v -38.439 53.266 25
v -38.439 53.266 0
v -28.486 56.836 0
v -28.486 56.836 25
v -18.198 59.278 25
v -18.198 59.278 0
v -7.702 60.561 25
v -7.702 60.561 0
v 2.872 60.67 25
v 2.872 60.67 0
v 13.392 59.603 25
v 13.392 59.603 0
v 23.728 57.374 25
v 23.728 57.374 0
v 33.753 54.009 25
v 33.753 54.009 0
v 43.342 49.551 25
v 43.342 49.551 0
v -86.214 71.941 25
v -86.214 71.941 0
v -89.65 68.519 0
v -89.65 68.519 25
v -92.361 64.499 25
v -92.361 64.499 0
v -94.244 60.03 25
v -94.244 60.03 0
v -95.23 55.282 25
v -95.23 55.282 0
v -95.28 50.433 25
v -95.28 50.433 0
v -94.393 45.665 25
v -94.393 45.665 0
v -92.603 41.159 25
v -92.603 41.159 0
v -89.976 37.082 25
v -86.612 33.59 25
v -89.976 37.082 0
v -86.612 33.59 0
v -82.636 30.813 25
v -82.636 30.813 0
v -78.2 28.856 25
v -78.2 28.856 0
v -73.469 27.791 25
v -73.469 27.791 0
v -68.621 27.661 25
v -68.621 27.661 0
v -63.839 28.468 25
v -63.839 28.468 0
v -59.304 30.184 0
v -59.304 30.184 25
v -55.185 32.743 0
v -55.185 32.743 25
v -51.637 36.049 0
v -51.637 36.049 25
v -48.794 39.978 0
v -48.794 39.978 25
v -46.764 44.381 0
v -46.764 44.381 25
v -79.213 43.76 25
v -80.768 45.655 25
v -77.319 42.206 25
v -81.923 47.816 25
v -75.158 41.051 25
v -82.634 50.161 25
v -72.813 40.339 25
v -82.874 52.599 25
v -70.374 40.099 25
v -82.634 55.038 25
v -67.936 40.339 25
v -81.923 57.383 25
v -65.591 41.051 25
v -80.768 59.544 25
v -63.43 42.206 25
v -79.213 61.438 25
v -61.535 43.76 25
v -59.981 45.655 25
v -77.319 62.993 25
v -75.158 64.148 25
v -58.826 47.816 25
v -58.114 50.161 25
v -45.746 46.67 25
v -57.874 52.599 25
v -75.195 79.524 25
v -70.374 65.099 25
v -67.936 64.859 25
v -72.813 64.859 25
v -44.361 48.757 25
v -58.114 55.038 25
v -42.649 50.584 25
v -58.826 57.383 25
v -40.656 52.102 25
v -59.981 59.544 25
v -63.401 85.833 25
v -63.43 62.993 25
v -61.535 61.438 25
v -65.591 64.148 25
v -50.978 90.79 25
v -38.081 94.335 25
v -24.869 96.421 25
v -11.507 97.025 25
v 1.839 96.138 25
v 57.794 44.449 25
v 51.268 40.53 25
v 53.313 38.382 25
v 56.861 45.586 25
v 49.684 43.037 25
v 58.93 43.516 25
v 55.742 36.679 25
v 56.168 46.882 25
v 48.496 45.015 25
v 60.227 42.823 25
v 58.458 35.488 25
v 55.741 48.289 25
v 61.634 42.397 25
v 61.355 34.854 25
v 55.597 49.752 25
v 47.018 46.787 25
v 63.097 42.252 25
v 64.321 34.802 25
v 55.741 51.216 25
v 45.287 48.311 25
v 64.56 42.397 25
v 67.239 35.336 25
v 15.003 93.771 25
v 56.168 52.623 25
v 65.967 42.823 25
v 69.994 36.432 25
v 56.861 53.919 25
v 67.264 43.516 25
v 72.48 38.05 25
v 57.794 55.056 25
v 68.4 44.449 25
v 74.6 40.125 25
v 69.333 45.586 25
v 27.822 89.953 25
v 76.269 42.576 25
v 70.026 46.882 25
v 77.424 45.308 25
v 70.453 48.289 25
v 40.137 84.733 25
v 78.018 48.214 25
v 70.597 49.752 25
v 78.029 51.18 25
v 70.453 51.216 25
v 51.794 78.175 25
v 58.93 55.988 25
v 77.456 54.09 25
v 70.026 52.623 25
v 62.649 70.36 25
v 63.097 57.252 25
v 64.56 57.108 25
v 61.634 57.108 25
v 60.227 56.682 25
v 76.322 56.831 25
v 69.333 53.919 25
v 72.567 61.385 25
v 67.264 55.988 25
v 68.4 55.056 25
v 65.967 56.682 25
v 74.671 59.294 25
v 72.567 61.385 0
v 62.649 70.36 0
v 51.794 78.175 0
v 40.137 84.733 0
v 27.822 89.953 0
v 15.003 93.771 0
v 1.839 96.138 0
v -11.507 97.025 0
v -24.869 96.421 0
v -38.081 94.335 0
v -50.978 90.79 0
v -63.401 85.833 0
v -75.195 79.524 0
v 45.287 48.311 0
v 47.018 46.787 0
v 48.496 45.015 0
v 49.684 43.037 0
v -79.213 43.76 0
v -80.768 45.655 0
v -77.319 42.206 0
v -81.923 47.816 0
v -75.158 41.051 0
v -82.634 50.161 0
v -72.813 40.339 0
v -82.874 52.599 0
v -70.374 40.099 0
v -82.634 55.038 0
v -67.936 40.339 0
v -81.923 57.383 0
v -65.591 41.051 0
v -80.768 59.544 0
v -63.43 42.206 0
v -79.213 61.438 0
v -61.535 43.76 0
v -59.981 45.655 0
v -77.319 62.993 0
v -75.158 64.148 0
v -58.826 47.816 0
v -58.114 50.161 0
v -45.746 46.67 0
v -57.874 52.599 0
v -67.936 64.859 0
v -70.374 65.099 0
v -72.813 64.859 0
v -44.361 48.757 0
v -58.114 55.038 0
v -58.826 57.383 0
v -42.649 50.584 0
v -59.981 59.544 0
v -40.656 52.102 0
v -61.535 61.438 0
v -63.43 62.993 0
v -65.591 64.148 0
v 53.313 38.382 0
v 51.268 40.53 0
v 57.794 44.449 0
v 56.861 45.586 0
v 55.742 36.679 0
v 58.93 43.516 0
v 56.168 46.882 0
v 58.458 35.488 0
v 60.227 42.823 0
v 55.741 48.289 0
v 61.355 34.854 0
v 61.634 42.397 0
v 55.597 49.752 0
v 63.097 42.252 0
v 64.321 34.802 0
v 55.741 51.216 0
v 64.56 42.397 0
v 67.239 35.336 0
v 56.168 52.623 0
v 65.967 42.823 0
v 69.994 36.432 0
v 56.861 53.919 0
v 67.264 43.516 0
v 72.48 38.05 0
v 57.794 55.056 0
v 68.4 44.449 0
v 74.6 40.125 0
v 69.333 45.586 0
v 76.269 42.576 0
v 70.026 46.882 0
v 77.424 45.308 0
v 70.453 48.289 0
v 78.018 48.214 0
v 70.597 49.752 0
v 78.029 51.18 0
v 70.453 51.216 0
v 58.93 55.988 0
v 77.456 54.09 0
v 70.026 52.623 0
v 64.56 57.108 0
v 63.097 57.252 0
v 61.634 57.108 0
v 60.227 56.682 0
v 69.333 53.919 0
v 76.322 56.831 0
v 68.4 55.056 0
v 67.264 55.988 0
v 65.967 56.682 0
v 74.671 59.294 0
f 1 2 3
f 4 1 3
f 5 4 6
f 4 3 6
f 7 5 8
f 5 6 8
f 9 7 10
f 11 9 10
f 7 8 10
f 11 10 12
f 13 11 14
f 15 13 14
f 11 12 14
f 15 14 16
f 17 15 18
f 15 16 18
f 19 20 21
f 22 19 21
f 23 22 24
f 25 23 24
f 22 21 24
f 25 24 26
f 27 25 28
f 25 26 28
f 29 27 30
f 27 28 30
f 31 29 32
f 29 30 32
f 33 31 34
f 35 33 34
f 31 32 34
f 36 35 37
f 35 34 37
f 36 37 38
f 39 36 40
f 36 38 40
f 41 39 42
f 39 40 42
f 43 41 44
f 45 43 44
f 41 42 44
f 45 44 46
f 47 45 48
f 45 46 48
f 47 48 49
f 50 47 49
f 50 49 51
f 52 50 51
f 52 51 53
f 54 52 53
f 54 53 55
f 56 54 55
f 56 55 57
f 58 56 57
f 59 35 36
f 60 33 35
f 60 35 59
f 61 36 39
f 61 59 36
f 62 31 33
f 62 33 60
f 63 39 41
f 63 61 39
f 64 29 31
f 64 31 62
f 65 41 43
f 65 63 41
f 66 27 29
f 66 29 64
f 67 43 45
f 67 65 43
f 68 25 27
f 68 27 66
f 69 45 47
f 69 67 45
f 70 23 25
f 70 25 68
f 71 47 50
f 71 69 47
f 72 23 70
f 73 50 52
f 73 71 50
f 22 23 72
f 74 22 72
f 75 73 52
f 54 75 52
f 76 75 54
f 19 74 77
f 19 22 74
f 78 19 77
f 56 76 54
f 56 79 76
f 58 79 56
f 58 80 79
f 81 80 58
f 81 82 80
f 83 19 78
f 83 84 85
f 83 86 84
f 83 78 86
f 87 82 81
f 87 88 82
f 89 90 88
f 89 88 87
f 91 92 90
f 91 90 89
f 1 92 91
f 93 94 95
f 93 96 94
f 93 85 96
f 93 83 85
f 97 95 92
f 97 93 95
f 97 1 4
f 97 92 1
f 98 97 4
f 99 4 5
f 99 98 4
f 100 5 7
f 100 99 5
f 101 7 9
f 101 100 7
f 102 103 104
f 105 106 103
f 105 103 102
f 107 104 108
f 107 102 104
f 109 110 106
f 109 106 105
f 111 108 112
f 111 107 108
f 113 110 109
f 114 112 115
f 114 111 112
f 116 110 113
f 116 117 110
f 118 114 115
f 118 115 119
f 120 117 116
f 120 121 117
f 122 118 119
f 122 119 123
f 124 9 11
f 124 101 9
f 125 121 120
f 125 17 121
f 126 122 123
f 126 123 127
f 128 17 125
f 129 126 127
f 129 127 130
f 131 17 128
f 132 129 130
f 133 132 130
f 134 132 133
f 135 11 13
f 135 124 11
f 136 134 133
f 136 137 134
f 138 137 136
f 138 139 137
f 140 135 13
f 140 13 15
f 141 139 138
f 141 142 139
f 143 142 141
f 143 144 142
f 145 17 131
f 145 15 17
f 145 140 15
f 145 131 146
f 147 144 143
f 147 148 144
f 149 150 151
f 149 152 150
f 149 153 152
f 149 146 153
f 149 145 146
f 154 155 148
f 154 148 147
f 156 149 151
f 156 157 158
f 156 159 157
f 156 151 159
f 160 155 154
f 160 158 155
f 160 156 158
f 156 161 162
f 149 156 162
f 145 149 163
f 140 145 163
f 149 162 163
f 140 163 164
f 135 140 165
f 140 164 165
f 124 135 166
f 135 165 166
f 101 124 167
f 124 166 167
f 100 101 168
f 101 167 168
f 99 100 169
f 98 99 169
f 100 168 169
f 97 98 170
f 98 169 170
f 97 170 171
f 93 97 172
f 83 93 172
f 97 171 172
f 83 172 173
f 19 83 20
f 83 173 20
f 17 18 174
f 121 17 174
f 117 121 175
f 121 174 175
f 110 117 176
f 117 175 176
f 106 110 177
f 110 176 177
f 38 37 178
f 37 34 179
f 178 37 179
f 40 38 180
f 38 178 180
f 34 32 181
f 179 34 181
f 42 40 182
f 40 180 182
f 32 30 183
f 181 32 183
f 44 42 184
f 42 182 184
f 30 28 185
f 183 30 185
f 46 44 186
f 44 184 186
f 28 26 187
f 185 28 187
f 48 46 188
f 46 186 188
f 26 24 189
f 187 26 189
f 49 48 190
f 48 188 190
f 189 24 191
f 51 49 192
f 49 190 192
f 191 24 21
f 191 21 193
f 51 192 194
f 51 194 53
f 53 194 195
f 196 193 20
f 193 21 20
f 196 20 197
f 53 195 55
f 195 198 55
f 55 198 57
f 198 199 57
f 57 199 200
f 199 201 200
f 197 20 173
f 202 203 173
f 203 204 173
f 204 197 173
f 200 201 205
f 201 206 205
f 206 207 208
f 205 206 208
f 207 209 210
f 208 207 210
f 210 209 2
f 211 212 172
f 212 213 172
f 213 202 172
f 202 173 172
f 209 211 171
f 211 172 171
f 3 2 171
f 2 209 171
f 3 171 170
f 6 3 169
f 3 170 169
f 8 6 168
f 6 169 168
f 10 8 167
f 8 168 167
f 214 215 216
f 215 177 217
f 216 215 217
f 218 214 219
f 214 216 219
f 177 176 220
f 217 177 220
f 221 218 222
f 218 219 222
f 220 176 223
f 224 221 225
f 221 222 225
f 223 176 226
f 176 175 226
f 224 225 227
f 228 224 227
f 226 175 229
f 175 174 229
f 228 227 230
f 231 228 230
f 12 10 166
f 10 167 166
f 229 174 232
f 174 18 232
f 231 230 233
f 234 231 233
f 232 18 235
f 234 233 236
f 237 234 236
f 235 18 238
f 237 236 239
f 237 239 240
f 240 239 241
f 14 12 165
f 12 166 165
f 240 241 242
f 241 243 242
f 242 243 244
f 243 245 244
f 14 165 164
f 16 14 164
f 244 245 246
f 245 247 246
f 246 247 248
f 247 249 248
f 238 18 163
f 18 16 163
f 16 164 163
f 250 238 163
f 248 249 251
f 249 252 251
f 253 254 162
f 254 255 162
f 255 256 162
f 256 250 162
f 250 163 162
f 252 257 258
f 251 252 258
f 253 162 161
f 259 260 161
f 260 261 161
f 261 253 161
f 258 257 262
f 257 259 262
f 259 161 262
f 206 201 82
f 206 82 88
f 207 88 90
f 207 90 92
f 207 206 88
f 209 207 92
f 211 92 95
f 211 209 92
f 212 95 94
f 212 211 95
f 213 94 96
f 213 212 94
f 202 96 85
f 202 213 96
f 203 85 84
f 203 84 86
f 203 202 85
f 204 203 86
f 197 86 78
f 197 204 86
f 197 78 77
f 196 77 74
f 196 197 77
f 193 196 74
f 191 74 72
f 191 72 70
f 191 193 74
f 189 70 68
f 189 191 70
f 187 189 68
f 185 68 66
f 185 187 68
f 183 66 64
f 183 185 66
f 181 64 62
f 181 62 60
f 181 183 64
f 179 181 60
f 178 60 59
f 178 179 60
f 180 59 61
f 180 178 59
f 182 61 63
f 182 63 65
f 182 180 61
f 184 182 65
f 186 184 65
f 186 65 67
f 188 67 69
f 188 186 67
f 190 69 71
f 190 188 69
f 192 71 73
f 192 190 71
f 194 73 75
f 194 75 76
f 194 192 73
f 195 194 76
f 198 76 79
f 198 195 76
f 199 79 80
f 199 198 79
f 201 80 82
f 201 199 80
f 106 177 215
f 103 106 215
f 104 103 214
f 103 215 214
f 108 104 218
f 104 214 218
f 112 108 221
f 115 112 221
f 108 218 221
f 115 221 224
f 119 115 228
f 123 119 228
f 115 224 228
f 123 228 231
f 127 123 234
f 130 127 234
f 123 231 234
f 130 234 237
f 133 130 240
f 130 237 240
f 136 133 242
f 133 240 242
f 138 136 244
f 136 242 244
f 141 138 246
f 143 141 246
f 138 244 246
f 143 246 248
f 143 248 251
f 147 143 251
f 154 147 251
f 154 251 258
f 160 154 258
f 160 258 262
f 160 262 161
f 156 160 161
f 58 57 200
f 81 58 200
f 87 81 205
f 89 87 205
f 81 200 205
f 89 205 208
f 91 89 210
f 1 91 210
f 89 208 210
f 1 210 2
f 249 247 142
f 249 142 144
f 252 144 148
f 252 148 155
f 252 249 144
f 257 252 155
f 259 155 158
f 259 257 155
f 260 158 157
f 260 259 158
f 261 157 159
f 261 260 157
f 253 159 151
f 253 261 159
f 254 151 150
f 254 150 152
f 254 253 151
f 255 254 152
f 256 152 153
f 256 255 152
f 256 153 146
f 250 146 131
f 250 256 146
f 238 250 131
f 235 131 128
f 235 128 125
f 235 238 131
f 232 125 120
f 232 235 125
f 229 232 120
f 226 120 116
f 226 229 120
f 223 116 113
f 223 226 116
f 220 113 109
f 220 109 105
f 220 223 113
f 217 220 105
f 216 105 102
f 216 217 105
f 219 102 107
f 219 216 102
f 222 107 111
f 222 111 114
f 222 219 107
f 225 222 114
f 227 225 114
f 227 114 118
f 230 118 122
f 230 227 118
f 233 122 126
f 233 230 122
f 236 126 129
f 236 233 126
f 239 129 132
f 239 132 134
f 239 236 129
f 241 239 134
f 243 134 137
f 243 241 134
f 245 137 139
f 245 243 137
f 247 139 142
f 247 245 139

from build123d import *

# Parameters (mm, degrees)
F0_R     = 12.5
F0_R_2   = 7.5
F1_DEPTH = 25


with BuildPart() as f1:
    # F0 (on Top) → F1 (new body)
    with BuildSketch(Plane.XY):
        with BuildLine():
            ThreePointArc((72.567013, 61.385173), (-4.822021, 96.767399), (-86.213806, 71.941162))
            ThreePointArc((-86.213806, 71.941162), (-84.691521, 32.104929), (-46.76355, 44.381405))
            ThreePointArc((-46.76355, 44.381405), (-43.543389, 49.706376), (-38.439264, 53.266243))
            ThreePointArc((-38.439264, 53.266243), (2.871879, 60.669961), (43.341674, 49.551455))
            ThreePointArc((43.341674, 49.551455), (47.018279, 46.786549), (49.684065, 43.037454))
            ThreePointArc((49.684065, 43.037454), (72.480393, 38.049741), (72.567013, 61.385173))
        make_face()
        with Locations((-70.374292, 52.599244)):
            Circle(F0_R, mode=Mode.SUBTRACT)
        with Locations((63.097075, 49.752448)):
            Circle(F0_R_2, mode=Mode.SUBTRACT)
    extrude(amount=F1_DEPTH)


solid = f1.part
